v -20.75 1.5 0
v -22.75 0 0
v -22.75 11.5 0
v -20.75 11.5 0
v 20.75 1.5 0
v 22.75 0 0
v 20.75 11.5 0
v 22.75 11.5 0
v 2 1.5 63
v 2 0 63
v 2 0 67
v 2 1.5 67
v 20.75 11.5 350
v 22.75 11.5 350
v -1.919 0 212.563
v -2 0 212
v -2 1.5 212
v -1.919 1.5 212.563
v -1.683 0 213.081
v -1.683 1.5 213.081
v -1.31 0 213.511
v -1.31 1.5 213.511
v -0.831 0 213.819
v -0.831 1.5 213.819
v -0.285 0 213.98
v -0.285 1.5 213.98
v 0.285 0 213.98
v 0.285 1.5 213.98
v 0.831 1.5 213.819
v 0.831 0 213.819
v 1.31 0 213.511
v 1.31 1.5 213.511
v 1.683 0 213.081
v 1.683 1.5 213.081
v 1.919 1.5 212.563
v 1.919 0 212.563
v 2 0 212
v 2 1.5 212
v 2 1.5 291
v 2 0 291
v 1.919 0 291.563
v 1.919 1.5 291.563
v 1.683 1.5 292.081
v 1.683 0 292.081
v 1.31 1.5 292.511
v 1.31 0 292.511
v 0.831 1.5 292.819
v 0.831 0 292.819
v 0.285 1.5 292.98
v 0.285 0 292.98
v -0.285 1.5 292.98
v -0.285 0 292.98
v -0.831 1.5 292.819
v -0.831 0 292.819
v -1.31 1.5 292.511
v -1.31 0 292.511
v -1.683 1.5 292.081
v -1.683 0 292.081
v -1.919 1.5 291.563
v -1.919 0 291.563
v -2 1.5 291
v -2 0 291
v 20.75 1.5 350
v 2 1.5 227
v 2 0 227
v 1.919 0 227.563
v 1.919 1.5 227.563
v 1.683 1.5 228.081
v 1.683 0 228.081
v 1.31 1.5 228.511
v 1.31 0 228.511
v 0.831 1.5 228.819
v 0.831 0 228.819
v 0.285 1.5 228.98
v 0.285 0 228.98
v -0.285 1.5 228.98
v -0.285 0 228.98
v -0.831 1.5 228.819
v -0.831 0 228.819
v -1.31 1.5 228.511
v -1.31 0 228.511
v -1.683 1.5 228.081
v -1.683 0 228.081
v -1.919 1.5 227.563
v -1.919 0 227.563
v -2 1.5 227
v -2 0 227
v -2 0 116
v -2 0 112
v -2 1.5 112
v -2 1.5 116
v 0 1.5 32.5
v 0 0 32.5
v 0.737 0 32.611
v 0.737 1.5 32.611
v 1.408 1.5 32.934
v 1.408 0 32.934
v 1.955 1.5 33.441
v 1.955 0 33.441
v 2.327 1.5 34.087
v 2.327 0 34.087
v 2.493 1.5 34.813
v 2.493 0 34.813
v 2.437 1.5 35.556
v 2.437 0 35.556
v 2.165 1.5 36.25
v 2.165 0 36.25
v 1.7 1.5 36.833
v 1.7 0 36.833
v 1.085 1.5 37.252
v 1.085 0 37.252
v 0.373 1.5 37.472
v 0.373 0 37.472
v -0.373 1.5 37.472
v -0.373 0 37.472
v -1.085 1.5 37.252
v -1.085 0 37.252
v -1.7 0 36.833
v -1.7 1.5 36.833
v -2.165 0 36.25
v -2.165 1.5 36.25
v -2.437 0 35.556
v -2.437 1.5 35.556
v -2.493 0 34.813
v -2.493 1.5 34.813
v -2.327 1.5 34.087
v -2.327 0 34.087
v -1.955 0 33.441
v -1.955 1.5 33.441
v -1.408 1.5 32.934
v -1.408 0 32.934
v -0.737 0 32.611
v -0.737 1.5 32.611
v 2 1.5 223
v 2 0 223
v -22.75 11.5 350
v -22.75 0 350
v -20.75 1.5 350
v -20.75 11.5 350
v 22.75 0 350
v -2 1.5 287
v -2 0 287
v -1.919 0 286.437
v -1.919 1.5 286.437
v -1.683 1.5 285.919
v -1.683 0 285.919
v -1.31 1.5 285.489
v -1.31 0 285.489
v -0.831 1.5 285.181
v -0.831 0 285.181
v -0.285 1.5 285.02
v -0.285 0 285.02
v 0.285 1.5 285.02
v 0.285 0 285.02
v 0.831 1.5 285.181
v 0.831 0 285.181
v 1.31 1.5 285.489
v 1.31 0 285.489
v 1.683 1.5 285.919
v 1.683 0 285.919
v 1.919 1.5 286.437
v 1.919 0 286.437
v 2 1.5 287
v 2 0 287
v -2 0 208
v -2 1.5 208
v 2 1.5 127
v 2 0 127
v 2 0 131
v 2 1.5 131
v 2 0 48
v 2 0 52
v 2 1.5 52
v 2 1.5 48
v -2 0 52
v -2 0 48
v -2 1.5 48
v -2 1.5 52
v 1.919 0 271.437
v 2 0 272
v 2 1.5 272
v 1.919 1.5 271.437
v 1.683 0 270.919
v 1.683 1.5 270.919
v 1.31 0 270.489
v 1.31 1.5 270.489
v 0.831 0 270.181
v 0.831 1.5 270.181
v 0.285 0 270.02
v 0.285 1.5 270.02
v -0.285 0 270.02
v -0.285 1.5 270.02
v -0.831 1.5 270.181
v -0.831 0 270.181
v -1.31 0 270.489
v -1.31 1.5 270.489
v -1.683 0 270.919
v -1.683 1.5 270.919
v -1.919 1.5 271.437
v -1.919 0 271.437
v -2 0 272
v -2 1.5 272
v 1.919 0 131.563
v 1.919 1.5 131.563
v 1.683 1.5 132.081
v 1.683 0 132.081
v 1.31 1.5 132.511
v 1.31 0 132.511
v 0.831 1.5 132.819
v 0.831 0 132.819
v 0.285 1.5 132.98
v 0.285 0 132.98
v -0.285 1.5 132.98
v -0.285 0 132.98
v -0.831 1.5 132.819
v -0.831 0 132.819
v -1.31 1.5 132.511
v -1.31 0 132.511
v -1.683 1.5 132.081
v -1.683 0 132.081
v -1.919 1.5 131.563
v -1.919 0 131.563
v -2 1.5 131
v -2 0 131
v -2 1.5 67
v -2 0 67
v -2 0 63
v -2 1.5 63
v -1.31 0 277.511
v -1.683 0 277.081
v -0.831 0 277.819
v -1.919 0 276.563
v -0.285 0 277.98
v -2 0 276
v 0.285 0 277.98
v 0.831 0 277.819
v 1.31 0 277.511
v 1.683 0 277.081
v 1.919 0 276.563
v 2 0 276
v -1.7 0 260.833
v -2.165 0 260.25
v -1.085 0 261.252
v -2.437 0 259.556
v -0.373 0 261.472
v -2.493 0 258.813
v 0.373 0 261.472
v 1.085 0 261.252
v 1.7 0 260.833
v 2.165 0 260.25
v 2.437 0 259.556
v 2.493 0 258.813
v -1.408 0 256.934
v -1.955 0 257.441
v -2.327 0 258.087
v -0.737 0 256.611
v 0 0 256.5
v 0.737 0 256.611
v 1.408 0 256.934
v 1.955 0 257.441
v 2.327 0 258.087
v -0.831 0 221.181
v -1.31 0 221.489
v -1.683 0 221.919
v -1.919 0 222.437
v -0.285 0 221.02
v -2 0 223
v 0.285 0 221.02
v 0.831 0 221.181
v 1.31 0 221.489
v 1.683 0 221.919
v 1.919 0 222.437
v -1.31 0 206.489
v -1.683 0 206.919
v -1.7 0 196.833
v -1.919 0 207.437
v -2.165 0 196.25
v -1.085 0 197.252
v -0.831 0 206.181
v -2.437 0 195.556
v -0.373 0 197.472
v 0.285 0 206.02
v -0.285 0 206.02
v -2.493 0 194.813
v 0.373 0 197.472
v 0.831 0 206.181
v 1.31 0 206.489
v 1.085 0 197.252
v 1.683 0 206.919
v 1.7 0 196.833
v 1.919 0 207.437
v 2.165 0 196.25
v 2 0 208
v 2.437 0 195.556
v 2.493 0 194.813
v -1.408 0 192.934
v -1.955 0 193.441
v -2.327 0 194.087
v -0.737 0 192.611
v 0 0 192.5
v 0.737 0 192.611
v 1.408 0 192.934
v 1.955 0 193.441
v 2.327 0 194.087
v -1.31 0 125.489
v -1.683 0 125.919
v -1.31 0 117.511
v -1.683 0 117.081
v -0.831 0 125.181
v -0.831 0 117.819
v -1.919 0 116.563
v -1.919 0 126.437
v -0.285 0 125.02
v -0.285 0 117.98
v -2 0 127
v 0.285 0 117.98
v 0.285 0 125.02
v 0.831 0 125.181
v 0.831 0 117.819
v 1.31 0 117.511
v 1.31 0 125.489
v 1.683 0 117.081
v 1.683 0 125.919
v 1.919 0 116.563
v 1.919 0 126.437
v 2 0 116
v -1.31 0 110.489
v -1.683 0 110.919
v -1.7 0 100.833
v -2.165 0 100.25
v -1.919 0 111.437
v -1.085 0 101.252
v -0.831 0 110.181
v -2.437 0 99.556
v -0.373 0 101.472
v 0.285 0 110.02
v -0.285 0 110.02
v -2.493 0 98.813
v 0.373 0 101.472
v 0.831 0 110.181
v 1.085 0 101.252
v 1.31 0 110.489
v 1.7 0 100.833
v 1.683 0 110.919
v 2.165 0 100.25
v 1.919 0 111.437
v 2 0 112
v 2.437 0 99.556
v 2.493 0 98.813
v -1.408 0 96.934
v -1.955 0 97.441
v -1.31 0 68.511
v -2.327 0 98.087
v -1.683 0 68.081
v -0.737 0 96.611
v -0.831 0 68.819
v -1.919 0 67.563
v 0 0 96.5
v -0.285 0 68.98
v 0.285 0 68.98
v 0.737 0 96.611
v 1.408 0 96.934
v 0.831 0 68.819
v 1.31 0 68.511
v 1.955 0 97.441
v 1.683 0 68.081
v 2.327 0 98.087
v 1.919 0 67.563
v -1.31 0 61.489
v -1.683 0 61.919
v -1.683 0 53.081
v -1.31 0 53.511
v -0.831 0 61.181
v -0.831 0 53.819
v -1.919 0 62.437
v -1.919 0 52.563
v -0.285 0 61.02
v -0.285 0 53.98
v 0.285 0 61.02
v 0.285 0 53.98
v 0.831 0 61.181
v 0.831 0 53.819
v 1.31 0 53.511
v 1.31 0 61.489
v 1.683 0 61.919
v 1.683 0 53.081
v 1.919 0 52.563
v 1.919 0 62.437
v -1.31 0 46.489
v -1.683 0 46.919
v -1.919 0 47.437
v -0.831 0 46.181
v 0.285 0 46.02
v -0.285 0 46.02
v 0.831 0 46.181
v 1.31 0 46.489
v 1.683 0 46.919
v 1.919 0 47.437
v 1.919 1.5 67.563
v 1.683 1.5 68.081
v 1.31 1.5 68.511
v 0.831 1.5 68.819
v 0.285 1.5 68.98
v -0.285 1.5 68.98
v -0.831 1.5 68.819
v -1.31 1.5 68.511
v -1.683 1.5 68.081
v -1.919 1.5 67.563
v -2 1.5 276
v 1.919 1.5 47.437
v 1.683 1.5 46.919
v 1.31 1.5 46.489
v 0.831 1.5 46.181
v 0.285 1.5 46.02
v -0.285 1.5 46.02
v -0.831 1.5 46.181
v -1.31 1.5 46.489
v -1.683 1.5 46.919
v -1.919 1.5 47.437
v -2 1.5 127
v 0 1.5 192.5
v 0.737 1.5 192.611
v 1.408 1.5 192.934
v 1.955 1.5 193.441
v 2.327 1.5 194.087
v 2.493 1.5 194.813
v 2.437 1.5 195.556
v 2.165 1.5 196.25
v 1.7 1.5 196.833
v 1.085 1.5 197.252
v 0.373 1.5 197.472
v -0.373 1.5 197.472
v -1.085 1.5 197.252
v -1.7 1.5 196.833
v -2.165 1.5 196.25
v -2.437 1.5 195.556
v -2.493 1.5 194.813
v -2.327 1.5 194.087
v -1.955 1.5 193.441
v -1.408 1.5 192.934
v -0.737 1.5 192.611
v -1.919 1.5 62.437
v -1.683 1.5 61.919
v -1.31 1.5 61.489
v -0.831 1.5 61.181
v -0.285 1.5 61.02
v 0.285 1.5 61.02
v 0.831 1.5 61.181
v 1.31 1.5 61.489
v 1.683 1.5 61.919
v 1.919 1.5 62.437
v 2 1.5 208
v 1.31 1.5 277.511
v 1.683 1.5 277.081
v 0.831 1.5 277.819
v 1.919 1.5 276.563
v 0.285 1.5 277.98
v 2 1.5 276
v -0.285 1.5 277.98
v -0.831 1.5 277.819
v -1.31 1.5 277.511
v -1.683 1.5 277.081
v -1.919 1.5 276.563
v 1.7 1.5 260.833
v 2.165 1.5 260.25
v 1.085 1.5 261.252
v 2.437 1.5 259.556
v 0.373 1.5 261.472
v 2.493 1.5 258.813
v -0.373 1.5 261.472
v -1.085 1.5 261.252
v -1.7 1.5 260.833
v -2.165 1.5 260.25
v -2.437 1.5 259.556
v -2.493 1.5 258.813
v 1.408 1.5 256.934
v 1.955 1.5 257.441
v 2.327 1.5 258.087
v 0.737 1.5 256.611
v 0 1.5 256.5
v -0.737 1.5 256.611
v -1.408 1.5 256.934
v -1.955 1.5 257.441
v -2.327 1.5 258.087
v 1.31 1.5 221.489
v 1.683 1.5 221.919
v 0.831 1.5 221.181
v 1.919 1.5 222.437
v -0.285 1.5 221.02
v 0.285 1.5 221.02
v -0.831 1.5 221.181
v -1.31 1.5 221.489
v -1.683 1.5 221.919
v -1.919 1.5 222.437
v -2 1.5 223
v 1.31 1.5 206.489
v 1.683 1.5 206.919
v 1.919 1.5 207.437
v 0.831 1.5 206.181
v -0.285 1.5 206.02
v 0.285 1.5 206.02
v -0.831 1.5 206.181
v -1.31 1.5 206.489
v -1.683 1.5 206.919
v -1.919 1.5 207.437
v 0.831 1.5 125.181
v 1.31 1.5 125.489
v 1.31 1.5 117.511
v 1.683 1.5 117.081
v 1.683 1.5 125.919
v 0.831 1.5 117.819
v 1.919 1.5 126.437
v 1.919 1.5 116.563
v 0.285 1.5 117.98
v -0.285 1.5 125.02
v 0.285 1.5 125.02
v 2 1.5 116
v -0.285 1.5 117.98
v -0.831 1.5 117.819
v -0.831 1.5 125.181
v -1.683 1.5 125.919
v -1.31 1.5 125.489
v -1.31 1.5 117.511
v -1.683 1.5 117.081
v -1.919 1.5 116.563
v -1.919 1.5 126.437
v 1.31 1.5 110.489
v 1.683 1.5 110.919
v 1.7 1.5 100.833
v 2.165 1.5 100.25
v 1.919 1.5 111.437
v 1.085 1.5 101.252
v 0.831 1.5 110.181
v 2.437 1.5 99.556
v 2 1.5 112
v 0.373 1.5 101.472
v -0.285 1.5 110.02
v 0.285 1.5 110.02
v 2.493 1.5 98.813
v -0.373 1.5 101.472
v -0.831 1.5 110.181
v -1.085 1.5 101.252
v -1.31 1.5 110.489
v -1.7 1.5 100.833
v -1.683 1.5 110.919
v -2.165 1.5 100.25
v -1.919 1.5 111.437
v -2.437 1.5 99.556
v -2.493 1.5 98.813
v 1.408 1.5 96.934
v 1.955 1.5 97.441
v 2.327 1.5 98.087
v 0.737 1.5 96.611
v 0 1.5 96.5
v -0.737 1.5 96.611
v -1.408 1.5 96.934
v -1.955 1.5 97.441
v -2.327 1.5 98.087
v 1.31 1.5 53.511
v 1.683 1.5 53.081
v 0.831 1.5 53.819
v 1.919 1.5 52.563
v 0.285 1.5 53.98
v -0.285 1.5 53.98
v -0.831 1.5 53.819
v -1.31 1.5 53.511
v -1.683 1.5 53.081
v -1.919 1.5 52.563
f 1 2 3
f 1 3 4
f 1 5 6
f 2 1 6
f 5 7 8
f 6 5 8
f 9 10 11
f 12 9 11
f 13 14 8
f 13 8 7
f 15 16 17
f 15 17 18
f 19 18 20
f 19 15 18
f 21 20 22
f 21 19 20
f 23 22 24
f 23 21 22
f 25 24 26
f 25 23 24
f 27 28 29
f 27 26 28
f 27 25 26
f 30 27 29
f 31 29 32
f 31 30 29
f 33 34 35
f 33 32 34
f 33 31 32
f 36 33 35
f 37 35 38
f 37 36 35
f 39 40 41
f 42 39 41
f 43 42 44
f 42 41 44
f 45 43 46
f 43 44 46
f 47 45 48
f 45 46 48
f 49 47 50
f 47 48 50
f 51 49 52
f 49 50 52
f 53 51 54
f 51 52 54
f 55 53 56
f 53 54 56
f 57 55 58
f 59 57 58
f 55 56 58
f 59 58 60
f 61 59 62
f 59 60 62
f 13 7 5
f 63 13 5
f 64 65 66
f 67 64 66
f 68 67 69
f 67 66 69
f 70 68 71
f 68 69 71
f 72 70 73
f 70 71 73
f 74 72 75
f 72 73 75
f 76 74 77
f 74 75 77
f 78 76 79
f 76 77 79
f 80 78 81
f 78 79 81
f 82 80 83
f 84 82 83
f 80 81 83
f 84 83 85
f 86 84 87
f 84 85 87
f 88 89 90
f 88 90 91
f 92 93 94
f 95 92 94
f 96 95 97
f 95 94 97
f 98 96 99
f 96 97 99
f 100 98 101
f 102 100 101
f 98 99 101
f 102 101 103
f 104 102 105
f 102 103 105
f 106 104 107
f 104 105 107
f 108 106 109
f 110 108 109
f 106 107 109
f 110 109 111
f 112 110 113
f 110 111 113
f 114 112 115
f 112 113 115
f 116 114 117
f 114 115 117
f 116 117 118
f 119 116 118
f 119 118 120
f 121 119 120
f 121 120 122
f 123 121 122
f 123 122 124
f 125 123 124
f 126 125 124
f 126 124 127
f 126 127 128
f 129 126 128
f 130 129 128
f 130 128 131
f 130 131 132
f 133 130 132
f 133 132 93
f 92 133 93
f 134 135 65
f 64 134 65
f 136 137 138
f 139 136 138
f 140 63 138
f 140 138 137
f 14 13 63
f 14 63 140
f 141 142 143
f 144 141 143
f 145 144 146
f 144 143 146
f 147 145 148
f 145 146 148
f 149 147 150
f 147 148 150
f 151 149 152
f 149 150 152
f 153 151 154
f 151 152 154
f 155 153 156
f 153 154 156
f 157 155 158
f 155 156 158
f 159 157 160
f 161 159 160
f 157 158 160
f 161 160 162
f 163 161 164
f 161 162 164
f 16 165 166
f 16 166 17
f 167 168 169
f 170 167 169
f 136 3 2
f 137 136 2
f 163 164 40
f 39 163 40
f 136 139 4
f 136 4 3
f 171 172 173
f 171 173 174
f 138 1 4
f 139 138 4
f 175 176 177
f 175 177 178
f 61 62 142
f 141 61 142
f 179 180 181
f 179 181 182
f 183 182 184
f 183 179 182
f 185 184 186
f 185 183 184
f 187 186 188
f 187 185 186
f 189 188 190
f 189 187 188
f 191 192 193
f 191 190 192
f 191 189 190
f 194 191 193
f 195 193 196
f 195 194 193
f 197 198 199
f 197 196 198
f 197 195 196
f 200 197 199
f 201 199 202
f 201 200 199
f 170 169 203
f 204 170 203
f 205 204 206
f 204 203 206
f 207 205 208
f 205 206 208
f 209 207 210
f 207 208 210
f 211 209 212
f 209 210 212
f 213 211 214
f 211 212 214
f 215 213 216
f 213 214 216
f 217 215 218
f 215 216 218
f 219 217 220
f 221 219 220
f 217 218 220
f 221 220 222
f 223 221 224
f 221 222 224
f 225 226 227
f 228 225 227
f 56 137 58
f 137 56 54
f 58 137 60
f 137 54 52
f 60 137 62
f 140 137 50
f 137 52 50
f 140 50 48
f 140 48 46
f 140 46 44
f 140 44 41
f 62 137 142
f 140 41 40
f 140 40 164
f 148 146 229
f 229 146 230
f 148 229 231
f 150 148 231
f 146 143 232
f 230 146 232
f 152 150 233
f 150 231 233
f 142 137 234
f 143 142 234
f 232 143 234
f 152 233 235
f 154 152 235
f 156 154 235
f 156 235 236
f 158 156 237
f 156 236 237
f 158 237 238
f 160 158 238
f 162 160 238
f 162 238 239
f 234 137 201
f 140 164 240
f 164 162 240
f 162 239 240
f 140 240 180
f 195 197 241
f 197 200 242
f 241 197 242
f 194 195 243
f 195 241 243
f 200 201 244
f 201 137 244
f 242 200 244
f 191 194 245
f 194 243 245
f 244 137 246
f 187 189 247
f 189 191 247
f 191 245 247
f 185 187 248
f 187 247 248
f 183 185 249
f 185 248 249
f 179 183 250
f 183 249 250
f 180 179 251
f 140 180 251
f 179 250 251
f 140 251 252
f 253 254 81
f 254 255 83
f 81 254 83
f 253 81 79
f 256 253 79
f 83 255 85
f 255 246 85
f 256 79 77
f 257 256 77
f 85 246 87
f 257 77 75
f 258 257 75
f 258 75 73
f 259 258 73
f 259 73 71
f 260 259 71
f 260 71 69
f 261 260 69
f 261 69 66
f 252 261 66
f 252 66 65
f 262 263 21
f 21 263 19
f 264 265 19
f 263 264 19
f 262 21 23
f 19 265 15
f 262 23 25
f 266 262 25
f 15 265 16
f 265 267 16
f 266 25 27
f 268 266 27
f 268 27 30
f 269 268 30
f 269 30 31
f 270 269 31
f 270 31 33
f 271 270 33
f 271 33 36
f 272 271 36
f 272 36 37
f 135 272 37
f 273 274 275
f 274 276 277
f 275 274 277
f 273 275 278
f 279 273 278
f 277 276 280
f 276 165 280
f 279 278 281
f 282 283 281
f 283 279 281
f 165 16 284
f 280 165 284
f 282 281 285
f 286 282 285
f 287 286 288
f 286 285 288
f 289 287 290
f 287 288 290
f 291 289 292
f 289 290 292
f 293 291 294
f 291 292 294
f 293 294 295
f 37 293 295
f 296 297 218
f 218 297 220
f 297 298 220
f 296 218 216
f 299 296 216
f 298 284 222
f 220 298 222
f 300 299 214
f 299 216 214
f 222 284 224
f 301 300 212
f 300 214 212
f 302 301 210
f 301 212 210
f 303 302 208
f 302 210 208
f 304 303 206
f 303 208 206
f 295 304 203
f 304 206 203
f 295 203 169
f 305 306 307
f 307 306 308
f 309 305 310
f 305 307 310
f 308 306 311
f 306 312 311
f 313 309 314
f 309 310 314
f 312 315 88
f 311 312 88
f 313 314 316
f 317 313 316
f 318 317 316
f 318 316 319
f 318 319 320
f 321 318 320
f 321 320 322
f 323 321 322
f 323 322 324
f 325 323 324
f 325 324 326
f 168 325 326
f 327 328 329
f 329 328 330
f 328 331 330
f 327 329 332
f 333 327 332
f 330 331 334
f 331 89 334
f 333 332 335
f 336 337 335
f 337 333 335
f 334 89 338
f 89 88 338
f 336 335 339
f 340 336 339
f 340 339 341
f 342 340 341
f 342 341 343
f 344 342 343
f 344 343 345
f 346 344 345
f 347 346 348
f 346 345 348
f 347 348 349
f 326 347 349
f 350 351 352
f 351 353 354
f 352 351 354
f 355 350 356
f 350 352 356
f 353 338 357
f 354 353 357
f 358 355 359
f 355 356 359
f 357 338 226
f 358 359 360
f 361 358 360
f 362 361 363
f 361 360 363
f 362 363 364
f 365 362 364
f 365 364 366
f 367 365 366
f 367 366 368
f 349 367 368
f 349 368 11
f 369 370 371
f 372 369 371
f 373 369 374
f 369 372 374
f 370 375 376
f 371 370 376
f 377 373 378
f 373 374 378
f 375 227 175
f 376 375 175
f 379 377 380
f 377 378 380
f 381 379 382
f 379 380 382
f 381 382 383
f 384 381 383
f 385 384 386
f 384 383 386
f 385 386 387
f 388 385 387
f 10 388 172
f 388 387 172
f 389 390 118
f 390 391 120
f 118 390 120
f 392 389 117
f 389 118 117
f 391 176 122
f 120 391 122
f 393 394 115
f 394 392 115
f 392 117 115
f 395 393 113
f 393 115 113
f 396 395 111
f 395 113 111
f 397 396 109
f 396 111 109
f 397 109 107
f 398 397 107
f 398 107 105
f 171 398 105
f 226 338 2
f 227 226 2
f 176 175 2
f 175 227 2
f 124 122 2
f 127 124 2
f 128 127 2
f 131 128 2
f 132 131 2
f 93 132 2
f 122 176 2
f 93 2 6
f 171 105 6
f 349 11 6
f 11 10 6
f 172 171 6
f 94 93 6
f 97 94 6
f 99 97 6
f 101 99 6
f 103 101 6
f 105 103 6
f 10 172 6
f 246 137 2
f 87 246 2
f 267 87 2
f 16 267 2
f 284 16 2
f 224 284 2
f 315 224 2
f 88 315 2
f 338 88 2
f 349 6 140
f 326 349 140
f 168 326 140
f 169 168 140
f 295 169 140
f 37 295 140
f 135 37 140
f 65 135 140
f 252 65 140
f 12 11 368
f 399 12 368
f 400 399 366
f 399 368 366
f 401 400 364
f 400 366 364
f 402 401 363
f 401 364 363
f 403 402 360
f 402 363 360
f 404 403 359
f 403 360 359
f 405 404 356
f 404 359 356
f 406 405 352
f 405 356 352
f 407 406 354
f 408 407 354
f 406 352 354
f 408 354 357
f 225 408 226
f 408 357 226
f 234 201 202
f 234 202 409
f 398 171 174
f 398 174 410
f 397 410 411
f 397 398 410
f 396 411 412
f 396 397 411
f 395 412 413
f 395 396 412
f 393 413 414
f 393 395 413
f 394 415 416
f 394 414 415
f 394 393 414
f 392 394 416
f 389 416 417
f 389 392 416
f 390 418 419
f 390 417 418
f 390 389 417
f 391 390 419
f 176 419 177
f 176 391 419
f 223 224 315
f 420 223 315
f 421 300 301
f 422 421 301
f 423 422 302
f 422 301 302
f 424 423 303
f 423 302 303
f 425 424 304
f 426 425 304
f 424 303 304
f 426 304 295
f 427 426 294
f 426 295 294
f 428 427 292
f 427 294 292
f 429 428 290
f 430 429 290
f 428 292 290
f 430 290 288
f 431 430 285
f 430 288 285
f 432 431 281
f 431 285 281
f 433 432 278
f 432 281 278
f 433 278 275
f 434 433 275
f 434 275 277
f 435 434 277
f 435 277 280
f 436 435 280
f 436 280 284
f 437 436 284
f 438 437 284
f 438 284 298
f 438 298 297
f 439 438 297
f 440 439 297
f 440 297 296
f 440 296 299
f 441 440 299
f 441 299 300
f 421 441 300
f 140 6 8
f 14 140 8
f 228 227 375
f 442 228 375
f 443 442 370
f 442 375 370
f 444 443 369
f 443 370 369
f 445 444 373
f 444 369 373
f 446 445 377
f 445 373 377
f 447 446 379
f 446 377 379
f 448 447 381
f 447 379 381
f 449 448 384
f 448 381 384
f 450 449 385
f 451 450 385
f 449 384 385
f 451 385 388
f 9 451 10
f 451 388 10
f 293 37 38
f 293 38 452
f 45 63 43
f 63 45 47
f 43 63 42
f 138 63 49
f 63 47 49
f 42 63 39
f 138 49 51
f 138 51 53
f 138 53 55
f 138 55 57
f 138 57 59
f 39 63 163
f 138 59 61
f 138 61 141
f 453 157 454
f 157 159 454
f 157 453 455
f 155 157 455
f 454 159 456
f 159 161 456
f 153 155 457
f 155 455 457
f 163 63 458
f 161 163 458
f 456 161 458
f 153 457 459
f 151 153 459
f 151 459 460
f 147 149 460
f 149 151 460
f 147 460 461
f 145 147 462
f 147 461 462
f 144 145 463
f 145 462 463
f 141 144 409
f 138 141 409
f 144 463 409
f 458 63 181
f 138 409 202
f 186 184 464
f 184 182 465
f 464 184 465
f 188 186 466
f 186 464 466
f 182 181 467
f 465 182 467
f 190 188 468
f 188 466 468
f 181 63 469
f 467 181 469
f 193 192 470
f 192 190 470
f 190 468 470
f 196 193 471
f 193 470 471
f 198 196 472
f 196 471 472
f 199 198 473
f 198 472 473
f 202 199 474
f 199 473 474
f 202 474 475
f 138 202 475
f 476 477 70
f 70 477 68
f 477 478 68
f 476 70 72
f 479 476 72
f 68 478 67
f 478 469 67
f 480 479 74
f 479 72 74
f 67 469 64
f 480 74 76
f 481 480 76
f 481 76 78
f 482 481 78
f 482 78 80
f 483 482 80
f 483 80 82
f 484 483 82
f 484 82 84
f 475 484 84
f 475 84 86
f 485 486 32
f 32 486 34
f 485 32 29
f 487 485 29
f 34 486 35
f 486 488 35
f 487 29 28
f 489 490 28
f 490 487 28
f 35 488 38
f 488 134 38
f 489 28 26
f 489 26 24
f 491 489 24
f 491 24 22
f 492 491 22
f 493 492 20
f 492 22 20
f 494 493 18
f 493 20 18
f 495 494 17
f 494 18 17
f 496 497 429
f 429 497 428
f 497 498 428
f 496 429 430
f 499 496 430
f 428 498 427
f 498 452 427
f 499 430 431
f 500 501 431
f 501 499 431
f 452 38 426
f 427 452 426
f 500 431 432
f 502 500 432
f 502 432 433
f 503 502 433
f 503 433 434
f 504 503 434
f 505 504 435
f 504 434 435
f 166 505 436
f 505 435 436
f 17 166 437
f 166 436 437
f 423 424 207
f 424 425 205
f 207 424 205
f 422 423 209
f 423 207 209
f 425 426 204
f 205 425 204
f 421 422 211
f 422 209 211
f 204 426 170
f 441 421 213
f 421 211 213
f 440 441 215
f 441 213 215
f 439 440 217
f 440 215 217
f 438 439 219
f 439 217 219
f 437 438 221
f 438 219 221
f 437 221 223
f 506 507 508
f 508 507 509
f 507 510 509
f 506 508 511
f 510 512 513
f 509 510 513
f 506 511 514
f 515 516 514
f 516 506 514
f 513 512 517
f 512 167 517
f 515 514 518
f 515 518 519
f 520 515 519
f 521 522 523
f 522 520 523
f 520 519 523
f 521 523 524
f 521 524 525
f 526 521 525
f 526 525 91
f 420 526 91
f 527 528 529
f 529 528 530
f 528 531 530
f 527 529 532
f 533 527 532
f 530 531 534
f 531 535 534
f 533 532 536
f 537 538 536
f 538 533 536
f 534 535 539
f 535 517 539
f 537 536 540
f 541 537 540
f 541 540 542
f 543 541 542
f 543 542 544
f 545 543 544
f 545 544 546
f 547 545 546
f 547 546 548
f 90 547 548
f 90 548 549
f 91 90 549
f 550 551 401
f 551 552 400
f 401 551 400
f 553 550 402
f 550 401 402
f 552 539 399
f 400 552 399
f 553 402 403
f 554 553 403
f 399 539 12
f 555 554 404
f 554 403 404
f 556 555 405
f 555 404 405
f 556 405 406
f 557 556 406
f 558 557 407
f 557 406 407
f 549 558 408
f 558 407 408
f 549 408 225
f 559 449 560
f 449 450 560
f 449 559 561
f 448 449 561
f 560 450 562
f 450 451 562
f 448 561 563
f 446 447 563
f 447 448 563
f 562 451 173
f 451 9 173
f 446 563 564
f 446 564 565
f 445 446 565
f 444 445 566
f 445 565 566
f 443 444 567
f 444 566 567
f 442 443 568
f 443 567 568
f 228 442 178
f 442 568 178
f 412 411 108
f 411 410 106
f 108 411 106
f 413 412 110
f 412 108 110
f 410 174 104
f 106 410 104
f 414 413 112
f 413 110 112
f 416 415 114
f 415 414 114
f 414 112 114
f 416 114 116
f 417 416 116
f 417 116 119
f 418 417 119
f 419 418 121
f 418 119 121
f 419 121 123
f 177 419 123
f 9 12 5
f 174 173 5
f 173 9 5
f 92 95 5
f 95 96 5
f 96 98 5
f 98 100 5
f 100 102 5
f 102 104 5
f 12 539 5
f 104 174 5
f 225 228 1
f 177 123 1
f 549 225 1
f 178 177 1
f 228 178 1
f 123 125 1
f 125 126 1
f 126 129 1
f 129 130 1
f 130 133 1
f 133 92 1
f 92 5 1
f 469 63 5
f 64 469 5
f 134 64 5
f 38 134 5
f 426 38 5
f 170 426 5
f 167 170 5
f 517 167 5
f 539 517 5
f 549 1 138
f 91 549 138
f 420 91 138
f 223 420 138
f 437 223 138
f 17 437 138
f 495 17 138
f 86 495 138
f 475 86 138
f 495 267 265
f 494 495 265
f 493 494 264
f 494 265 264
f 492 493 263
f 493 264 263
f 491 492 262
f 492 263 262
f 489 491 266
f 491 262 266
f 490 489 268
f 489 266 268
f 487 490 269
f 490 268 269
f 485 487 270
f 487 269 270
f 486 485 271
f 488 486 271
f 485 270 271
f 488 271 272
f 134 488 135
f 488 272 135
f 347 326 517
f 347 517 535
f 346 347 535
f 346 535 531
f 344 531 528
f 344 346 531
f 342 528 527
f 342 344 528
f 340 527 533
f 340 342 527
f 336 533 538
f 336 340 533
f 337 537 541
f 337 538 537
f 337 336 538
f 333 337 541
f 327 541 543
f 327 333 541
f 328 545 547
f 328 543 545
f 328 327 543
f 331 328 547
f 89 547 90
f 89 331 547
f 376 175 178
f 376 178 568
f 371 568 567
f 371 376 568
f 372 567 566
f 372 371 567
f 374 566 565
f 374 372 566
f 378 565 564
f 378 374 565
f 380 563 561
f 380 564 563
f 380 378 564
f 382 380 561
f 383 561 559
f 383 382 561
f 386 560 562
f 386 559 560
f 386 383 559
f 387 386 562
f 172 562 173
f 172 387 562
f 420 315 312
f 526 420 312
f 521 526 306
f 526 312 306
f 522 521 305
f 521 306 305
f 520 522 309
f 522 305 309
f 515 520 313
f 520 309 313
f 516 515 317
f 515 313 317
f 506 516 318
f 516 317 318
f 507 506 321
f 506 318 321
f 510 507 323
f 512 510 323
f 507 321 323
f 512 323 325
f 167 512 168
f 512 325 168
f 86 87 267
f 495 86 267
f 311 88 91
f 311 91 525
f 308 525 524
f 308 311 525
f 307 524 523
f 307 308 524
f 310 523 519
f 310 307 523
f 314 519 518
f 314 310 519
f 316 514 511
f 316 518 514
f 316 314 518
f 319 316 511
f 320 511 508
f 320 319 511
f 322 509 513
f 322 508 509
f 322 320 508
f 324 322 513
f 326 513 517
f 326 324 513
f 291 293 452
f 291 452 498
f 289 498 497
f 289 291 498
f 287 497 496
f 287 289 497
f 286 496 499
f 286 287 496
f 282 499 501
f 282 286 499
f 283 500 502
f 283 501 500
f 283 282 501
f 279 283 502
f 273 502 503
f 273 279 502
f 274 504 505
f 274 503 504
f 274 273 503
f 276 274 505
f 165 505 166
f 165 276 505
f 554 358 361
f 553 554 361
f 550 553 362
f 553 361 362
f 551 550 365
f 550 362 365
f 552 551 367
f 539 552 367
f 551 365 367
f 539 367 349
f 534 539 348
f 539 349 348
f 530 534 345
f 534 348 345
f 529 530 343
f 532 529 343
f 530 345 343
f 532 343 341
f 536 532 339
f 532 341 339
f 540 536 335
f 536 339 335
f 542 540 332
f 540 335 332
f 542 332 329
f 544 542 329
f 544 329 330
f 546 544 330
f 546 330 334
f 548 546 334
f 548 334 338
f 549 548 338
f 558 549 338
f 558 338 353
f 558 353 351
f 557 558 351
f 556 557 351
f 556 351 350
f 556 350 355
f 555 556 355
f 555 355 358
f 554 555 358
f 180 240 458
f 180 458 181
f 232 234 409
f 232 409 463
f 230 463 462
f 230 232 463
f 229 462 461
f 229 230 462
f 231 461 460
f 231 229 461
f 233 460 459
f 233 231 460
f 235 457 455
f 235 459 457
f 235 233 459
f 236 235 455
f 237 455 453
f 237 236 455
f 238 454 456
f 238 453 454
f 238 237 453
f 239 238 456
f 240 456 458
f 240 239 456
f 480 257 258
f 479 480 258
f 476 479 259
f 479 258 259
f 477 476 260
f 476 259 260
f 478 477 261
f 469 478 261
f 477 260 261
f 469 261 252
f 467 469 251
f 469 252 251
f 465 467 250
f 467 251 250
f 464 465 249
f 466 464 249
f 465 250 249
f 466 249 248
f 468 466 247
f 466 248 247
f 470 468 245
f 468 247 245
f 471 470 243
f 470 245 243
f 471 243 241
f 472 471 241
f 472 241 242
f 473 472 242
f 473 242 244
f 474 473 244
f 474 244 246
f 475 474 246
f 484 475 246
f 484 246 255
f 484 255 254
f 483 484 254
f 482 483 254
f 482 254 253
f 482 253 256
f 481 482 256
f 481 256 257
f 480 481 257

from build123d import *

# Parameters (mm, degrees)
EXTRUDE_1_DEPTH                  = 350
SKETCH_2_R                       = 2.5
CUT_EXTRUDE_1_DEPTH              = 350
PATTERN_LINEAR_1_COUNT           = 2
PATTERN_LINEAR_1_PITCH           = 64
PATTERN_LINEAR_2_COUNT           = 2
PATTERN_LINEAR_2_PITCH           = 160
PATTERN_LINEAR_3_COPY_1_SKETCH_R = 2.5
PATTERN_LINEAR_3_COPY_1_DEPTH    = 350
PATTERN_LINEAR_3_COPY_2_SKETCH_R = 2.5
PATTERN_LINEAR_3_COPY_2_DEPTH    = 350


with BuildPart() as part:
    # 草图1 → 凸台-拉伸1 (new body)
    with BuildSketch(Plane.XY):
        Polygon((-22.75, 0), (22.75, 0), (22.75, 11.5), (20.75, 11.5), (20.75, 1.5), (-20.75, 1.5), (-20.75, 11.5), (-22.75, 11.5), align=None)
    extrude(amount=EXTRUDE_1_DEPTH)

    # 草图2 → 切除-拉伸1 (cut)
    with BuildSketch(Plane.XZ):
        with Locations(Location((0, 35, 0), (0, 0, 270))):
            Circle(SKETCH_2_R)
        with BuildLine():
            Line((2, 52), (2, 48))
            ThreePointArc((2, 48), (0, 46), (-2, 48))
            Line((-2, 48), (-2, 52))
            ThreePointArc((-2, 52), (0, 54), (2, 52))
        make_face()
        with BuildLine():
            Line((-2, 67), (-2, 63))
            ThreePointArc((-2, 63), (0, 61), (2, 63))
            Line((2, 63), (2, 67))
            ThreePointArc((2, 67), (0, 69), (-2, 67))
        make_face()
    cut_extrude_1 = extrude(amount=-CUT_EXTRUDE_1_DEPTH, mode=Mode.SUBTRACT)

    # 阵列(线性)1: 切除-拉伸1 ×2
    with Locations(*[(0, 0, i * PATTERN_LINEAR_1_PITCH) for i in range(1, PATTERN_LINEAR_1_COUNT)]):
        add(cut_extrude_1, mode=Mode.SUBTRACT)

    # 阵列(线性)2: 切除-拉伸1 ×2
    with Locations(*[(0, 0, i * PATTERN_LINEAR_2_PITCH) for i in range(1, PATTERN_LINEAR_2_COUNT)]):
        add(cut_extrude_1, mode=Mode.SUBTRACT)

    # 阵列(线性)3 copy 1 sketch → 阵列(线性)3 copy 1 (cut)
    with BuildSketch(Plane(origin=(0, 0, 224), x_dir=(1, 0, 0), z_dir=(0, -1, 0))):
        with Locations(Location((0, 35, 0), (0, 0, 270))):
            Circle(PATTERN_LINEAR_3_COPY_1_SKETCH_R)
        with BuildLine():
            Line((2, 52), (2, 48))
            ThreePointArc((2, 48), (0, 46), (-2, 48))
            Line((-2, 48), (-2, 52))
            ThreePointArc((-2, 52), (0, 54), (2, 52))
        make_face()
        with BuildLine():
            Line((-2, 67), (-2, 63))
            ThreePointArc((-2, 63), (0, 61), (2, 63))
            Line((2, 63), (2, 67))
            ThreePointArc((2, 67), (0, 69), (-2, 67))
        make_face()
    extrude(amount=-PATTERN_LINEAR_3_COPY_1_DEPTH, mode=Mode.SUBTRACT)

    # 阵列(线性)3 copy 2 sketch → 阵列(线性)3 copy 2 (cut)
    with BuildSketch(Plane(origin=(0, 0, 160), x_dir=(1, 0, 0), z_dir=(0, -1, 0))):
        with Locations(Location((0, 35, 0), (0, 0, 270))):
            Circle(PATTERN_LINEAR_3_COPY_2_SKETCH_R)
        with BuildLine():
            Line((2, 52), (2, 48))
            ThreePointArc((2, 48), (0, 46), (-2, 48))
            Line((-2, 48), (-2, 52))
            ThreePointArc((-2, 52), (0, 54), (2, 52))
        make_face()
        with BuildLine():
            Line((-2, 67), (-2, 63))
            ThreePointArc((-2, 63), (0, 61), (2, 63))
            Line((2, 63), (2, 67))
            ThreePointArc((2, 67), (0, 69), (-2, 67))
        make_face()
    extrude(amount=-PATTERN_LINEAR_3_COPY_2_DEPTH, mode=Mode.SUBTRACT)


solid = part.part
